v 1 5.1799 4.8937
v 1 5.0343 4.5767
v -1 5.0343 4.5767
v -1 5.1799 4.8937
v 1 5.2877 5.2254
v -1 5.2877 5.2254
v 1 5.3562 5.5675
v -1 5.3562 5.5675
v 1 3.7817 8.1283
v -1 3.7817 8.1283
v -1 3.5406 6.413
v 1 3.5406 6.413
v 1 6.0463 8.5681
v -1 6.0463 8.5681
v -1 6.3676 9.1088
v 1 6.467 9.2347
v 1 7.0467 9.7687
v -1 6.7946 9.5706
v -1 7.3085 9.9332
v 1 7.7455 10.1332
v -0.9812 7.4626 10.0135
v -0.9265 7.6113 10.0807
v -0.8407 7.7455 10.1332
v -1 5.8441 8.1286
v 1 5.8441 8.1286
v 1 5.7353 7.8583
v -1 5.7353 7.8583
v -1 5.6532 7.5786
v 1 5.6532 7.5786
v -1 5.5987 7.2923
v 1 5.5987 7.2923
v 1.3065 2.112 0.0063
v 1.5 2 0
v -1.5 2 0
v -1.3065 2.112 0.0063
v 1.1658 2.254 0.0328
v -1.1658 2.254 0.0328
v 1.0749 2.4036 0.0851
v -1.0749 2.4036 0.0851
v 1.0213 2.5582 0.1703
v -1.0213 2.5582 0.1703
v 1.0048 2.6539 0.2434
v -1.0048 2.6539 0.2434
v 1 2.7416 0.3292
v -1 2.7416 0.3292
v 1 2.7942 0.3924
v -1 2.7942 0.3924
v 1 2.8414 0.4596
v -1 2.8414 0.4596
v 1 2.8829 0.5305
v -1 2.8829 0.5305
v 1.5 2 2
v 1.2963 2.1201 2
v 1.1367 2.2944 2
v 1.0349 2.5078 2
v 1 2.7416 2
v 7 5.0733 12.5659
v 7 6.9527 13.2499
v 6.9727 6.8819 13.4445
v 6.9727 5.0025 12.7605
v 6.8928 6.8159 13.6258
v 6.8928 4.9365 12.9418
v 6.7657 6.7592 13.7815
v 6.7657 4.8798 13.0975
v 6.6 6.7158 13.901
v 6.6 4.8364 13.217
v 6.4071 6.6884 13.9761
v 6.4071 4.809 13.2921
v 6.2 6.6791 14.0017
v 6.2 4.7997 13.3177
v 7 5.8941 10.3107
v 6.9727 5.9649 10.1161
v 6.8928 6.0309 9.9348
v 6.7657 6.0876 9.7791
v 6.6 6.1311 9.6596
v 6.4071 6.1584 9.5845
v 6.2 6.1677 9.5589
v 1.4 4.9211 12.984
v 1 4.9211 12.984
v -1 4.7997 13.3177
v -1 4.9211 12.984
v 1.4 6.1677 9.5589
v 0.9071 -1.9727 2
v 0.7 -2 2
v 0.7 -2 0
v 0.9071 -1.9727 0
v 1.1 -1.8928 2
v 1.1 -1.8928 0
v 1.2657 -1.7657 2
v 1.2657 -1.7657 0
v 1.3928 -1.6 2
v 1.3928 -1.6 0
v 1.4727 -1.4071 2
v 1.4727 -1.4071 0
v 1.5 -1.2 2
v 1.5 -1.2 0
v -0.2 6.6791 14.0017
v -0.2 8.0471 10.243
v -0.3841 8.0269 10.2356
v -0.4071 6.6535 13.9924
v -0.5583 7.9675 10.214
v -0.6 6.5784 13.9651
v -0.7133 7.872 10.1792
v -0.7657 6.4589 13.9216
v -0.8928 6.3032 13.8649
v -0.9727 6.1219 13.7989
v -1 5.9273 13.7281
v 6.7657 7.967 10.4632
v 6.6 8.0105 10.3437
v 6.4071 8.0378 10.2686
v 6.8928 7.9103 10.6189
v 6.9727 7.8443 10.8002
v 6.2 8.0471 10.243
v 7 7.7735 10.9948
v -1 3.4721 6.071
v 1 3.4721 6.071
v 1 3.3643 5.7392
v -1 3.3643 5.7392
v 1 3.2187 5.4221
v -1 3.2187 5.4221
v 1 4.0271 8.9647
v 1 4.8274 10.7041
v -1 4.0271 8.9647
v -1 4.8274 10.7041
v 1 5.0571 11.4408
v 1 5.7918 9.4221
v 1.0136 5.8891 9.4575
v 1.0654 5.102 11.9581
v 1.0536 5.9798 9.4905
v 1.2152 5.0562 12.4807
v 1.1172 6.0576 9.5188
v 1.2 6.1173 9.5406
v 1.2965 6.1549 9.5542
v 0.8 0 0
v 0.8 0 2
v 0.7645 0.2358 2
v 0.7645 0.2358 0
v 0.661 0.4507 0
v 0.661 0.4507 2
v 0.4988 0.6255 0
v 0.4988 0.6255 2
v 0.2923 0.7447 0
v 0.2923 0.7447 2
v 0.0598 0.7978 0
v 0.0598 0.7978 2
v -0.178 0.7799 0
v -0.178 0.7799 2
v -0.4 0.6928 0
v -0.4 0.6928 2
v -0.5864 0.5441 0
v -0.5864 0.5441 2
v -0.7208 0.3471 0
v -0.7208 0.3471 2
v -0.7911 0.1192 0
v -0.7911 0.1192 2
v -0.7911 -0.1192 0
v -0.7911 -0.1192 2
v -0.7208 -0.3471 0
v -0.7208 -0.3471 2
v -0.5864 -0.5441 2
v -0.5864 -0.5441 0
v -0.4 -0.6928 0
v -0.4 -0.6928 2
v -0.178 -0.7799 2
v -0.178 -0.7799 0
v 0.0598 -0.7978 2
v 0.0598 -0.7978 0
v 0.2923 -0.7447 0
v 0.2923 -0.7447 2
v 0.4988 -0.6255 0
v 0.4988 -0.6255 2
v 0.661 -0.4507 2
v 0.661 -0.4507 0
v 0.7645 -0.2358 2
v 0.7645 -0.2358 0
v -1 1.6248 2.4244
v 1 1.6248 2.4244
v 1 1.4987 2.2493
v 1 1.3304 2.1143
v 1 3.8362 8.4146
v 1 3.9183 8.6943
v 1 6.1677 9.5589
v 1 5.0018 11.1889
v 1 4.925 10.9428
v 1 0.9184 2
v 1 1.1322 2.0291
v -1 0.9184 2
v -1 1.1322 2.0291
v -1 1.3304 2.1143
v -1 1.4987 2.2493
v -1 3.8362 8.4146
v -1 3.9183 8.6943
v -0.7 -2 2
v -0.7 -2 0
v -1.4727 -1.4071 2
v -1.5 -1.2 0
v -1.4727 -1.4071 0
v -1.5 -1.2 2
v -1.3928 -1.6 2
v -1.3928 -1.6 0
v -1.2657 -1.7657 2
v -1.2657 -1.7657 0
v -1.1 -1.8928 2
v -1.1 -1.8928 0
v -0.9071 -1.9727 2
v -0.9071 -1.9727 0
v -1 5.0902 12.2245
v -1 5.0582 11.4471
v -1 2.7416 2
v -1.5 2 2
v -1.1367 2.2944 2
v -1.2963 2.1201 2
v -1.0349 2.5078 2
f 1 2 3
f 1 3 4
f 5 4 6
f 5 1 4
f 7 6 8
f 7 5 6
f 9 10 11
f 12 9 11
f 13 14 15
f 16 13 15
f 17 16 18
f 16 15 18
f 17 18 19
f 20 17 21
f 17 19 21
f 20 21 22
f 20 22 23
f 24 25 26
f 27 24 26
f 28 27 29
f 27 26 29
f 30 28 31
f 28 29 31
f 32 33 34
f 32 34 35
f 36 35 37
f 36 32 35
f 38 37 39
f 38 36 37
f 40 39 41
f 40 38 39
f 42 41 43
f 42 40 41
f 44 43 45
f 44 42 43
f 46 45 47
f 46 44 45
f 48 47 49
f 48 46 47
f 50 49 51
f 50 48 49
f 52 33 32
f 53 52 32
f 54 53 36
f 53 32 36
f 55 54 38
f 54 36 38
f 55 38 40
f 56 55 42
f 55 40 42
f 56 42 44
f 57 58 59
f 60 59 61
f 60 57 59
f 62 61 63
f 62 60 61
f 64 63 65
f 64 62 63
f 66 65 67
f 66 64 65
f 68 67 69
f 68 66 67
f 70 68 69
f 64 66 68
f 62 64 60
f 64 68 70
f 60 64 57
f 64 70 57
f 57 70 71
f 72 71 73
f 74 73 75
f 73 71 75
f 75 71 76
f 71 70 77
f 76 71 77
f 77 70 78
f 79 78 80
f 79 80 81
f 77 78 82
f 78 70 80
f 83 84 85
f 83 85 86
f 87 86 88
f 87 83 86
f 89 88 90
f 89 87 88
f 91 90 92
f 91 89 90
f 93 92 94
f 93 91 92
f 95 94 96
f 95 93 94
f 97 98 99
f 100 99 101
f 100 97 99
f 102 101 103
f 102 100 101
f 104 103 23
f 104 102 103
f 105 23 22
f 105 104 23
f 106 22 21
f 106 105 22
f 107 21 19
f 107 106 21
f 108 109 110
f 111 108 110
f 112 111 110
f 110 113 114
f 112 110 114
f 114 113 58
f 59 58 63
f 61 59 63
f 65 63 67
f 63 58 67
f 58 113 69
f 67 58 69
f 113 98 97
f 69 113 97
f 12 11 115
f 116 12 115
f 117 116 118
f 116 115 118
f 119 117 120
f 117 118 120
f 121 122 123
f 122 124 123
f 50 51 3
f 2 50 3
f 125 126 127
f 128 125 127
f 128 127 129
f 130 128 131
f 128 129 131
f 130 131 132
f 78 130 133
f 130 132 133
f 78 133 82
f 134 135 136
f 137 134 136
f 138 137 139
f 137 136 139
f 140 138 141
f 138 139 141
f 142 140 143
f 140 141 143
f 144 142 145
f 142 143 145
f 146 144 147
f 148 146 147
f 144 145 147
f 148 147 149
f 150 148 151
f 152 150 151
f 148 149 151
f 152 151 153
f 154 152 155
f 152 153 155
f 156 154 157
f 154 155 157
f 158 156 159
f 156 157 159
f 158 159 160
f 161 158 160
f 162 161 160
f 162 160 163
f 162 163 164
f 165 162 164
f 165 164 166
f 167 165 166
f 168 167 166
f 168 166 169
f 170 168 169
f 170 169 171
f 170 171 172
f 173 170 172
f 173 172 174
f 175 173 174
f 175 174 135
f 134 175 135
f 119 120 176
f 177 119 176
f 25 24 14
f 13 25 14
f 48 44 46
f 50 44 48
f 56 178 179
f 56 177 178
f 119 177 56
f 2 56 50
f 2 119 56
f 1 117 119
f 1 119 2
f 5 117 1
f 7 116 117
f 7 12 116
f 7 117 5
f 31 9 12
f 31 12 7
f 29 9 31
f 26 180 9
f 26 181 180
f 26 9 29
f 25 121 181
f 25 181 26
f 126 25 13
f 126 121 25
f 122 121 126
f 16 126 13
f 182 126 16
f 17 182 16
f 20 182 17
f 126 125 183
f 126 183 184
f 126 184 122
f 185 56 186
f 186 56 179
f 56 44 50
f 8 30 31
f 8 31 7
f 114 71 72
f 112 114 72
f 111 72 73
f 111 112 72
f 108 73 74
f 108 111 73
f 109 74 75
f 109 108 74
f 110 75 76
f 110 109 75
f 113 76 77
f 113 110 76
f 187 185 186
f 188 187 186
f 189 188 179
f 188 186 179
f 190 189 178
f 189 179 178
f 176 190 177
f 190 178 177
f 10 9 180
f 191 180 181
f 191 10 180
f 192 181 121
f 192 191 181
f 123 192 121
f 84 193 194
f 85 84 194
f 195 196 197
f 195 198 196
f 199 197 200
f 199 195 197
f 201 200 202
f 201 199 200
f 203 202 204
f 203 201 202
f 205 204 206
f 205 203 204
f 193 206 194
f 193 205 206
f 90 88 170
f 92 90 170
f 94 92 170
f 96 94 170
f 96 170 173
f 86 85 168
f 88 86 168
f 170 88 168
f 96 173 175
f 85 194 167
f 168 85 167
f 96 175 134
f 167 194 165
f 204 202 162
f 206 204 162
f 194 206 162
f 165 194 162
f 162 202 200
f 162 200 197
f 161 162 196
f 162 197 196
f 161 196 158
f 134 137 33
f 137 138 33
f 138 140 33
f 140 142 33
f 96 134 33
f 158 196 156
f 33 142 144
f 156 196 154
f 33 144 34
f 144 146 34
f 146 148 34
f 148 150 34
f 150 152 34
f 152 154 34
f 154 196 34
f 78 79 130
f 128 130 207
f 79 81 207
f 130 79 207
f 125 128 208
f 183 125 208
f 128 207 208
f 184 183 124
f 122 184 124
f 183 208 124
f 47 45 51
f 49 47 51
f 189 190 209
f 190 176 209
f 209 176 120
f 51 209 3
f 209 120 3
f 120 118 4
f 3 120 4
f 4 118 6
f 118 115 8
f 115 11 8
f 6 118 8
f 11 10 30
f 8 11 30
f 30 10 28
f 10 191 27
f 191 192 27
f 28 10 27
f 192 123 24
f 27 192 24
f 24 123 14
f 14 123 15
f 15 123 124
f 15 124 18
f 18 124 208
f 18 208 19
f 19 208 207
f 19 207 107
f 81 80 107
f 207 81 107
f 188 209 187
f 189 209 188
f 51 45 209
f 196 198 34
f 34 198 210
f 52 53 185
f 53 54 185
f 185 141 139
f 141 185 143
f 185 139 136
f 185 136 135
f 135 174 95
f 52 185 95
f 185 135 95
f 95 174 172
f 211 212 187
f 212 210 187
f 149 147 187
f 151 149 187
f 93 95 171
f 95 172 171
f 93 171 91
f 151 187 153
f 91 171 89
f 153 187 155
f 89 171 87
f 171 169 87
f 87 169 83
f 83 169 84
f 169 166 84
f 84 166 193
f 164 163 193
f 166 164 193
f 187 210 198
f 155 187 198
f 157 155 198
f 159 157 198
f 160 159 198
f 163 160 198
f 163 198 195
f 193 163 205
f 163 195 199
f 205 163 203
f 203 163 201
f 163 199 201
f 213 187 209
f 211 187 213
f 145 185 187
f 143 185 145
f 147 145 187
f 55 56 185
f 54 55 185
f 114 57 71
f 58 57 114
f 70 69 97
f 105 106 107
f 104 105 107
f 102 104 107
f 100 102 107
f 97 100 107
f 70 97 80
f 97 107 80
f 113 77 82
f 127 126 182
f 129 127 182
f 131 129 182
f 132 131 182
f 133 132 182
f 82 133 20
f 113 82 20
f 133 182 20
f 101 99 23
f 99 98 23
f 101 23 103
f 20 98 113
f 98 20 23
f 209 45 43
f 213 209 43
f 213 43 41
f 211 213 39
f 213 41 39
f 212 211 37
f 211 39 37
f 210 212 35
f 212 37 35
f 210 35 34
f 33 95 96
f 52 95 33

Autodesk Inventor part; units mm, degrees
ref_plane "YZ Plane" through (0, 0, 0) normal (1, 0, 0) x (0, 1, 0)
ref_plane "XZ Plane" through (0, 0, 0) normal (0, 1, 0) x (-1, 0, 0)
ref_plane "XY Plane" through (0, 0, 0) normal (0, 0, 1) x (1, 0, 0)
sketch "スケッチ5" plane through (0, 0, 0) normal (1, 0, 0) x (0, 1, 0)
  line L0 (0, 0) -> (0, 1.2936) construction
  line L1 (0, 0) -> (-1.3338, 0) construction
  line L2 (2, 2) -> (-2, 2)
  line L3 (-2, 2) -> (-2, 0)
  line L4 (-2, 0) -> (2, 0)
  line L5 (2, 0) -> (2, 2)
  line L6 (0.8, 2) -> (0.8, 0)
  line L7 (-0.8, 2) -> (-0.8, 0)
  line L8 (-2, 1) -> (2, 1) construction
  line L9 (2, 1) -> (7.1642, 10.7124) construction
  line L10 (8.0471, 10.243) -> (6.2812, 11.1819)
  line L11 (6.2812, 11.1819) -> (0.7025, 0.6899)
  line L12 (0.7025, 0.6899) -> (2.4684, -0.2491)
  line L13 (2.4684, -0.2491) -> (8.0471, 10.243)
  line L14 (2, 0) -> (2.6009, 0)
  line L15 (6.6791, 14.0017) -> (4.7997, 13.3177)
  line L16 (4.7997, 13.3177) -> (6.1677, 9.5589)
  line L17 (6.1677, 9.5589) -> (8.0471, 10.243)
  line L18 (8.0471, 10.243) -> (6.6791, 14.0017)
  line L19 (6.6791, 14.0017) -> (6.1677, 9.5589) construction
  line L20 (4.7997, 13.3177) -> (8.0471, 10.243) construction
  line L21 (5.7394, 13.6597) -> (7.1074, 9.9009) construction
  line L22 (6.4234, 11.7803) -> (4.7515, 8.1465) construction
  line L23 (4.7515, 8.1465) -> (4.3748, 5.4664) construction
  line L24 (6.2812, 11.1819) -> (2.4684, -0.2491) construction
  line L25 (0.7025, 0.6899) -> (8.0471, 10.243) construction
  line L26 (7.3319, 11.3623) -> (5.5149, 12.1983)
  line L27 (5.5149, 12.1983) -> (3.843, 8.5645)
  line L28 (3.843, 8.5645) -> (5.66, 7.7285)
  line L29 (5.66, 7.7285) -> (7.3319, 11.3623)
  line L30 (7.3319, 11.3623) -> (3.843, 8.5645) construction
  line L31 (5.5149, 12.1983) -> (5.66, 7.7285) construction
  line L32 (5.66, 7.7285) -> (5.2826, 5.0437)
  line L33 (3.843, 8.5645) -> (2.6532, 0.0985)
  line L34 (3.467, 5.8892) -> (5.2329, 4.9502)
  point P0 (1.3991, 2)
  point P1 (5.5874, 9.9634)
  point P2 (5.3431, 11.8247)
  point P3 (6.5694, 9.7051)
  dimension "d25" = 1.6
  dimension "d26" = 4
  dimension "d27" = 2
  dimension "d28" = 118
  dimension "d29" = 2
  dimension "d30" = 11
  dimension "d44" = 2
  dimension "d45" = 20
  dimension "d46" = 4
  dimension "d52" = 20
  dimension "d53" = 4
  dimension "d54" = 2
extrude "押し出し8" add sketch "スケッチ5" along normal mid plane 3 contours L6 L11 L12 L4 L7 L2 | L2 L11 L6 | L7 L4 L3 L2 | L2 L5 L12 L6 L11 | L6 L12 L11 | L12 L4 L6
ref_plane "作業平面7" through (-1.5, -2, 2) normal (0, 0, 1) x (1, 0, 0)
sketch "スケッチ6" plane through (-1.5, -2, 2) normal (0, 0, 1) x (1, 0, 0)
  line L0 (3, 0) -> (0, 0) projected
  line L1 (3, 4) -> (3, 0) projected
  line L2 (0, 4) -> (3, 4) projected
  line L3 (0, 0) -> (0, 4) projected
  line L4 (0, 4) -> (3, 4) projected
  line L5 (0, 4) -> (3, 0) construction
  line L6 (0, 0) -> (3, 0) projected
  line L7 (3, 0) -> (3, 4) projected
  line L8 (0, 0) -> (3, 4) construction
  circle A0 centre (1.5, 2) radius 0.8
  dimension "d35" = 1.6
extrude "押し出し9" cut sketch "スケッチ6" against normal blind 4 contours A0
extrude "押し出し13" add sketch "スケッチ5" along normal blind 7 contours L16 L27 L26 L29 L10 L11 | L11 L10 L29 L17 L16 | L16 L15 L18 L10 L29 L26 L27 | L29 L10 L17
extrude "押し出し15" add sketch "スケッチ5" along normal mid plane 2 contours L11 L33 L13 L14 L5 L2 | L33 L28 L11 | L34 L13 L33 | L11 L28 L32 L13 L34 | L28 L27 L16 L11 | L11 L16 L17 L29 L28 | L16 L27 L26 L29 L10 L11 | L11 L10 L29 L17 L16
extrude "押し出し16" add sketch "スケッチ5" against normal blind 1 contours L16 L15 L18 L10 L29 L26 L27 | L29 L10 L17
fillet "フィレット1" radius 0.8 1 edges at (0, 1.3991, 2)
fillet "フィレット2" radius 1 1 edges at (0, 2.6009, 0)
fillet "フィレット3" radius 3 4 edges at (0, 5.2826, 5.0437) (0, 3.467, 5.8892) (0, 3.843, 8.5645) (0, 5.66, 7.7285)
fillet "フィレット4" radius 3 2 edges at (0, 5.3431, 11.8247) (0, 6.5694, 9.7051)
fillet "フィレット6" radius 0.8 1 edges at (-1, 7.3631, 12.1223)
ref_plane "作業平面8" through (-0.2, 5.7394, 13.6597) normal (0, 0.9396926, 0.3420201) x (1, 0, 0)
sketch "スケッチ8" plane through (-0.2, 5.7394, 13.6597) normal (0, 0.9396926, 0.3420201) x (1, 0, 0)
  point P0 (0.2, 10.8729)
fillet "フィレット11" radius 0.8 2 edges at (7, 5.7394, 13.6597) (7, 7.1074, 9.9009)
fillet "フィレット12" radius 0.8 4 edges at (1, 2, 1) (-1, 2, 1) (-1.5, -2, 1) (1.5, -2, 1)
fillet "フィレット13" radius 0.4 1 edges at (1, 5.5444, 11.2714)
properties part number "battery-stopper-1"
